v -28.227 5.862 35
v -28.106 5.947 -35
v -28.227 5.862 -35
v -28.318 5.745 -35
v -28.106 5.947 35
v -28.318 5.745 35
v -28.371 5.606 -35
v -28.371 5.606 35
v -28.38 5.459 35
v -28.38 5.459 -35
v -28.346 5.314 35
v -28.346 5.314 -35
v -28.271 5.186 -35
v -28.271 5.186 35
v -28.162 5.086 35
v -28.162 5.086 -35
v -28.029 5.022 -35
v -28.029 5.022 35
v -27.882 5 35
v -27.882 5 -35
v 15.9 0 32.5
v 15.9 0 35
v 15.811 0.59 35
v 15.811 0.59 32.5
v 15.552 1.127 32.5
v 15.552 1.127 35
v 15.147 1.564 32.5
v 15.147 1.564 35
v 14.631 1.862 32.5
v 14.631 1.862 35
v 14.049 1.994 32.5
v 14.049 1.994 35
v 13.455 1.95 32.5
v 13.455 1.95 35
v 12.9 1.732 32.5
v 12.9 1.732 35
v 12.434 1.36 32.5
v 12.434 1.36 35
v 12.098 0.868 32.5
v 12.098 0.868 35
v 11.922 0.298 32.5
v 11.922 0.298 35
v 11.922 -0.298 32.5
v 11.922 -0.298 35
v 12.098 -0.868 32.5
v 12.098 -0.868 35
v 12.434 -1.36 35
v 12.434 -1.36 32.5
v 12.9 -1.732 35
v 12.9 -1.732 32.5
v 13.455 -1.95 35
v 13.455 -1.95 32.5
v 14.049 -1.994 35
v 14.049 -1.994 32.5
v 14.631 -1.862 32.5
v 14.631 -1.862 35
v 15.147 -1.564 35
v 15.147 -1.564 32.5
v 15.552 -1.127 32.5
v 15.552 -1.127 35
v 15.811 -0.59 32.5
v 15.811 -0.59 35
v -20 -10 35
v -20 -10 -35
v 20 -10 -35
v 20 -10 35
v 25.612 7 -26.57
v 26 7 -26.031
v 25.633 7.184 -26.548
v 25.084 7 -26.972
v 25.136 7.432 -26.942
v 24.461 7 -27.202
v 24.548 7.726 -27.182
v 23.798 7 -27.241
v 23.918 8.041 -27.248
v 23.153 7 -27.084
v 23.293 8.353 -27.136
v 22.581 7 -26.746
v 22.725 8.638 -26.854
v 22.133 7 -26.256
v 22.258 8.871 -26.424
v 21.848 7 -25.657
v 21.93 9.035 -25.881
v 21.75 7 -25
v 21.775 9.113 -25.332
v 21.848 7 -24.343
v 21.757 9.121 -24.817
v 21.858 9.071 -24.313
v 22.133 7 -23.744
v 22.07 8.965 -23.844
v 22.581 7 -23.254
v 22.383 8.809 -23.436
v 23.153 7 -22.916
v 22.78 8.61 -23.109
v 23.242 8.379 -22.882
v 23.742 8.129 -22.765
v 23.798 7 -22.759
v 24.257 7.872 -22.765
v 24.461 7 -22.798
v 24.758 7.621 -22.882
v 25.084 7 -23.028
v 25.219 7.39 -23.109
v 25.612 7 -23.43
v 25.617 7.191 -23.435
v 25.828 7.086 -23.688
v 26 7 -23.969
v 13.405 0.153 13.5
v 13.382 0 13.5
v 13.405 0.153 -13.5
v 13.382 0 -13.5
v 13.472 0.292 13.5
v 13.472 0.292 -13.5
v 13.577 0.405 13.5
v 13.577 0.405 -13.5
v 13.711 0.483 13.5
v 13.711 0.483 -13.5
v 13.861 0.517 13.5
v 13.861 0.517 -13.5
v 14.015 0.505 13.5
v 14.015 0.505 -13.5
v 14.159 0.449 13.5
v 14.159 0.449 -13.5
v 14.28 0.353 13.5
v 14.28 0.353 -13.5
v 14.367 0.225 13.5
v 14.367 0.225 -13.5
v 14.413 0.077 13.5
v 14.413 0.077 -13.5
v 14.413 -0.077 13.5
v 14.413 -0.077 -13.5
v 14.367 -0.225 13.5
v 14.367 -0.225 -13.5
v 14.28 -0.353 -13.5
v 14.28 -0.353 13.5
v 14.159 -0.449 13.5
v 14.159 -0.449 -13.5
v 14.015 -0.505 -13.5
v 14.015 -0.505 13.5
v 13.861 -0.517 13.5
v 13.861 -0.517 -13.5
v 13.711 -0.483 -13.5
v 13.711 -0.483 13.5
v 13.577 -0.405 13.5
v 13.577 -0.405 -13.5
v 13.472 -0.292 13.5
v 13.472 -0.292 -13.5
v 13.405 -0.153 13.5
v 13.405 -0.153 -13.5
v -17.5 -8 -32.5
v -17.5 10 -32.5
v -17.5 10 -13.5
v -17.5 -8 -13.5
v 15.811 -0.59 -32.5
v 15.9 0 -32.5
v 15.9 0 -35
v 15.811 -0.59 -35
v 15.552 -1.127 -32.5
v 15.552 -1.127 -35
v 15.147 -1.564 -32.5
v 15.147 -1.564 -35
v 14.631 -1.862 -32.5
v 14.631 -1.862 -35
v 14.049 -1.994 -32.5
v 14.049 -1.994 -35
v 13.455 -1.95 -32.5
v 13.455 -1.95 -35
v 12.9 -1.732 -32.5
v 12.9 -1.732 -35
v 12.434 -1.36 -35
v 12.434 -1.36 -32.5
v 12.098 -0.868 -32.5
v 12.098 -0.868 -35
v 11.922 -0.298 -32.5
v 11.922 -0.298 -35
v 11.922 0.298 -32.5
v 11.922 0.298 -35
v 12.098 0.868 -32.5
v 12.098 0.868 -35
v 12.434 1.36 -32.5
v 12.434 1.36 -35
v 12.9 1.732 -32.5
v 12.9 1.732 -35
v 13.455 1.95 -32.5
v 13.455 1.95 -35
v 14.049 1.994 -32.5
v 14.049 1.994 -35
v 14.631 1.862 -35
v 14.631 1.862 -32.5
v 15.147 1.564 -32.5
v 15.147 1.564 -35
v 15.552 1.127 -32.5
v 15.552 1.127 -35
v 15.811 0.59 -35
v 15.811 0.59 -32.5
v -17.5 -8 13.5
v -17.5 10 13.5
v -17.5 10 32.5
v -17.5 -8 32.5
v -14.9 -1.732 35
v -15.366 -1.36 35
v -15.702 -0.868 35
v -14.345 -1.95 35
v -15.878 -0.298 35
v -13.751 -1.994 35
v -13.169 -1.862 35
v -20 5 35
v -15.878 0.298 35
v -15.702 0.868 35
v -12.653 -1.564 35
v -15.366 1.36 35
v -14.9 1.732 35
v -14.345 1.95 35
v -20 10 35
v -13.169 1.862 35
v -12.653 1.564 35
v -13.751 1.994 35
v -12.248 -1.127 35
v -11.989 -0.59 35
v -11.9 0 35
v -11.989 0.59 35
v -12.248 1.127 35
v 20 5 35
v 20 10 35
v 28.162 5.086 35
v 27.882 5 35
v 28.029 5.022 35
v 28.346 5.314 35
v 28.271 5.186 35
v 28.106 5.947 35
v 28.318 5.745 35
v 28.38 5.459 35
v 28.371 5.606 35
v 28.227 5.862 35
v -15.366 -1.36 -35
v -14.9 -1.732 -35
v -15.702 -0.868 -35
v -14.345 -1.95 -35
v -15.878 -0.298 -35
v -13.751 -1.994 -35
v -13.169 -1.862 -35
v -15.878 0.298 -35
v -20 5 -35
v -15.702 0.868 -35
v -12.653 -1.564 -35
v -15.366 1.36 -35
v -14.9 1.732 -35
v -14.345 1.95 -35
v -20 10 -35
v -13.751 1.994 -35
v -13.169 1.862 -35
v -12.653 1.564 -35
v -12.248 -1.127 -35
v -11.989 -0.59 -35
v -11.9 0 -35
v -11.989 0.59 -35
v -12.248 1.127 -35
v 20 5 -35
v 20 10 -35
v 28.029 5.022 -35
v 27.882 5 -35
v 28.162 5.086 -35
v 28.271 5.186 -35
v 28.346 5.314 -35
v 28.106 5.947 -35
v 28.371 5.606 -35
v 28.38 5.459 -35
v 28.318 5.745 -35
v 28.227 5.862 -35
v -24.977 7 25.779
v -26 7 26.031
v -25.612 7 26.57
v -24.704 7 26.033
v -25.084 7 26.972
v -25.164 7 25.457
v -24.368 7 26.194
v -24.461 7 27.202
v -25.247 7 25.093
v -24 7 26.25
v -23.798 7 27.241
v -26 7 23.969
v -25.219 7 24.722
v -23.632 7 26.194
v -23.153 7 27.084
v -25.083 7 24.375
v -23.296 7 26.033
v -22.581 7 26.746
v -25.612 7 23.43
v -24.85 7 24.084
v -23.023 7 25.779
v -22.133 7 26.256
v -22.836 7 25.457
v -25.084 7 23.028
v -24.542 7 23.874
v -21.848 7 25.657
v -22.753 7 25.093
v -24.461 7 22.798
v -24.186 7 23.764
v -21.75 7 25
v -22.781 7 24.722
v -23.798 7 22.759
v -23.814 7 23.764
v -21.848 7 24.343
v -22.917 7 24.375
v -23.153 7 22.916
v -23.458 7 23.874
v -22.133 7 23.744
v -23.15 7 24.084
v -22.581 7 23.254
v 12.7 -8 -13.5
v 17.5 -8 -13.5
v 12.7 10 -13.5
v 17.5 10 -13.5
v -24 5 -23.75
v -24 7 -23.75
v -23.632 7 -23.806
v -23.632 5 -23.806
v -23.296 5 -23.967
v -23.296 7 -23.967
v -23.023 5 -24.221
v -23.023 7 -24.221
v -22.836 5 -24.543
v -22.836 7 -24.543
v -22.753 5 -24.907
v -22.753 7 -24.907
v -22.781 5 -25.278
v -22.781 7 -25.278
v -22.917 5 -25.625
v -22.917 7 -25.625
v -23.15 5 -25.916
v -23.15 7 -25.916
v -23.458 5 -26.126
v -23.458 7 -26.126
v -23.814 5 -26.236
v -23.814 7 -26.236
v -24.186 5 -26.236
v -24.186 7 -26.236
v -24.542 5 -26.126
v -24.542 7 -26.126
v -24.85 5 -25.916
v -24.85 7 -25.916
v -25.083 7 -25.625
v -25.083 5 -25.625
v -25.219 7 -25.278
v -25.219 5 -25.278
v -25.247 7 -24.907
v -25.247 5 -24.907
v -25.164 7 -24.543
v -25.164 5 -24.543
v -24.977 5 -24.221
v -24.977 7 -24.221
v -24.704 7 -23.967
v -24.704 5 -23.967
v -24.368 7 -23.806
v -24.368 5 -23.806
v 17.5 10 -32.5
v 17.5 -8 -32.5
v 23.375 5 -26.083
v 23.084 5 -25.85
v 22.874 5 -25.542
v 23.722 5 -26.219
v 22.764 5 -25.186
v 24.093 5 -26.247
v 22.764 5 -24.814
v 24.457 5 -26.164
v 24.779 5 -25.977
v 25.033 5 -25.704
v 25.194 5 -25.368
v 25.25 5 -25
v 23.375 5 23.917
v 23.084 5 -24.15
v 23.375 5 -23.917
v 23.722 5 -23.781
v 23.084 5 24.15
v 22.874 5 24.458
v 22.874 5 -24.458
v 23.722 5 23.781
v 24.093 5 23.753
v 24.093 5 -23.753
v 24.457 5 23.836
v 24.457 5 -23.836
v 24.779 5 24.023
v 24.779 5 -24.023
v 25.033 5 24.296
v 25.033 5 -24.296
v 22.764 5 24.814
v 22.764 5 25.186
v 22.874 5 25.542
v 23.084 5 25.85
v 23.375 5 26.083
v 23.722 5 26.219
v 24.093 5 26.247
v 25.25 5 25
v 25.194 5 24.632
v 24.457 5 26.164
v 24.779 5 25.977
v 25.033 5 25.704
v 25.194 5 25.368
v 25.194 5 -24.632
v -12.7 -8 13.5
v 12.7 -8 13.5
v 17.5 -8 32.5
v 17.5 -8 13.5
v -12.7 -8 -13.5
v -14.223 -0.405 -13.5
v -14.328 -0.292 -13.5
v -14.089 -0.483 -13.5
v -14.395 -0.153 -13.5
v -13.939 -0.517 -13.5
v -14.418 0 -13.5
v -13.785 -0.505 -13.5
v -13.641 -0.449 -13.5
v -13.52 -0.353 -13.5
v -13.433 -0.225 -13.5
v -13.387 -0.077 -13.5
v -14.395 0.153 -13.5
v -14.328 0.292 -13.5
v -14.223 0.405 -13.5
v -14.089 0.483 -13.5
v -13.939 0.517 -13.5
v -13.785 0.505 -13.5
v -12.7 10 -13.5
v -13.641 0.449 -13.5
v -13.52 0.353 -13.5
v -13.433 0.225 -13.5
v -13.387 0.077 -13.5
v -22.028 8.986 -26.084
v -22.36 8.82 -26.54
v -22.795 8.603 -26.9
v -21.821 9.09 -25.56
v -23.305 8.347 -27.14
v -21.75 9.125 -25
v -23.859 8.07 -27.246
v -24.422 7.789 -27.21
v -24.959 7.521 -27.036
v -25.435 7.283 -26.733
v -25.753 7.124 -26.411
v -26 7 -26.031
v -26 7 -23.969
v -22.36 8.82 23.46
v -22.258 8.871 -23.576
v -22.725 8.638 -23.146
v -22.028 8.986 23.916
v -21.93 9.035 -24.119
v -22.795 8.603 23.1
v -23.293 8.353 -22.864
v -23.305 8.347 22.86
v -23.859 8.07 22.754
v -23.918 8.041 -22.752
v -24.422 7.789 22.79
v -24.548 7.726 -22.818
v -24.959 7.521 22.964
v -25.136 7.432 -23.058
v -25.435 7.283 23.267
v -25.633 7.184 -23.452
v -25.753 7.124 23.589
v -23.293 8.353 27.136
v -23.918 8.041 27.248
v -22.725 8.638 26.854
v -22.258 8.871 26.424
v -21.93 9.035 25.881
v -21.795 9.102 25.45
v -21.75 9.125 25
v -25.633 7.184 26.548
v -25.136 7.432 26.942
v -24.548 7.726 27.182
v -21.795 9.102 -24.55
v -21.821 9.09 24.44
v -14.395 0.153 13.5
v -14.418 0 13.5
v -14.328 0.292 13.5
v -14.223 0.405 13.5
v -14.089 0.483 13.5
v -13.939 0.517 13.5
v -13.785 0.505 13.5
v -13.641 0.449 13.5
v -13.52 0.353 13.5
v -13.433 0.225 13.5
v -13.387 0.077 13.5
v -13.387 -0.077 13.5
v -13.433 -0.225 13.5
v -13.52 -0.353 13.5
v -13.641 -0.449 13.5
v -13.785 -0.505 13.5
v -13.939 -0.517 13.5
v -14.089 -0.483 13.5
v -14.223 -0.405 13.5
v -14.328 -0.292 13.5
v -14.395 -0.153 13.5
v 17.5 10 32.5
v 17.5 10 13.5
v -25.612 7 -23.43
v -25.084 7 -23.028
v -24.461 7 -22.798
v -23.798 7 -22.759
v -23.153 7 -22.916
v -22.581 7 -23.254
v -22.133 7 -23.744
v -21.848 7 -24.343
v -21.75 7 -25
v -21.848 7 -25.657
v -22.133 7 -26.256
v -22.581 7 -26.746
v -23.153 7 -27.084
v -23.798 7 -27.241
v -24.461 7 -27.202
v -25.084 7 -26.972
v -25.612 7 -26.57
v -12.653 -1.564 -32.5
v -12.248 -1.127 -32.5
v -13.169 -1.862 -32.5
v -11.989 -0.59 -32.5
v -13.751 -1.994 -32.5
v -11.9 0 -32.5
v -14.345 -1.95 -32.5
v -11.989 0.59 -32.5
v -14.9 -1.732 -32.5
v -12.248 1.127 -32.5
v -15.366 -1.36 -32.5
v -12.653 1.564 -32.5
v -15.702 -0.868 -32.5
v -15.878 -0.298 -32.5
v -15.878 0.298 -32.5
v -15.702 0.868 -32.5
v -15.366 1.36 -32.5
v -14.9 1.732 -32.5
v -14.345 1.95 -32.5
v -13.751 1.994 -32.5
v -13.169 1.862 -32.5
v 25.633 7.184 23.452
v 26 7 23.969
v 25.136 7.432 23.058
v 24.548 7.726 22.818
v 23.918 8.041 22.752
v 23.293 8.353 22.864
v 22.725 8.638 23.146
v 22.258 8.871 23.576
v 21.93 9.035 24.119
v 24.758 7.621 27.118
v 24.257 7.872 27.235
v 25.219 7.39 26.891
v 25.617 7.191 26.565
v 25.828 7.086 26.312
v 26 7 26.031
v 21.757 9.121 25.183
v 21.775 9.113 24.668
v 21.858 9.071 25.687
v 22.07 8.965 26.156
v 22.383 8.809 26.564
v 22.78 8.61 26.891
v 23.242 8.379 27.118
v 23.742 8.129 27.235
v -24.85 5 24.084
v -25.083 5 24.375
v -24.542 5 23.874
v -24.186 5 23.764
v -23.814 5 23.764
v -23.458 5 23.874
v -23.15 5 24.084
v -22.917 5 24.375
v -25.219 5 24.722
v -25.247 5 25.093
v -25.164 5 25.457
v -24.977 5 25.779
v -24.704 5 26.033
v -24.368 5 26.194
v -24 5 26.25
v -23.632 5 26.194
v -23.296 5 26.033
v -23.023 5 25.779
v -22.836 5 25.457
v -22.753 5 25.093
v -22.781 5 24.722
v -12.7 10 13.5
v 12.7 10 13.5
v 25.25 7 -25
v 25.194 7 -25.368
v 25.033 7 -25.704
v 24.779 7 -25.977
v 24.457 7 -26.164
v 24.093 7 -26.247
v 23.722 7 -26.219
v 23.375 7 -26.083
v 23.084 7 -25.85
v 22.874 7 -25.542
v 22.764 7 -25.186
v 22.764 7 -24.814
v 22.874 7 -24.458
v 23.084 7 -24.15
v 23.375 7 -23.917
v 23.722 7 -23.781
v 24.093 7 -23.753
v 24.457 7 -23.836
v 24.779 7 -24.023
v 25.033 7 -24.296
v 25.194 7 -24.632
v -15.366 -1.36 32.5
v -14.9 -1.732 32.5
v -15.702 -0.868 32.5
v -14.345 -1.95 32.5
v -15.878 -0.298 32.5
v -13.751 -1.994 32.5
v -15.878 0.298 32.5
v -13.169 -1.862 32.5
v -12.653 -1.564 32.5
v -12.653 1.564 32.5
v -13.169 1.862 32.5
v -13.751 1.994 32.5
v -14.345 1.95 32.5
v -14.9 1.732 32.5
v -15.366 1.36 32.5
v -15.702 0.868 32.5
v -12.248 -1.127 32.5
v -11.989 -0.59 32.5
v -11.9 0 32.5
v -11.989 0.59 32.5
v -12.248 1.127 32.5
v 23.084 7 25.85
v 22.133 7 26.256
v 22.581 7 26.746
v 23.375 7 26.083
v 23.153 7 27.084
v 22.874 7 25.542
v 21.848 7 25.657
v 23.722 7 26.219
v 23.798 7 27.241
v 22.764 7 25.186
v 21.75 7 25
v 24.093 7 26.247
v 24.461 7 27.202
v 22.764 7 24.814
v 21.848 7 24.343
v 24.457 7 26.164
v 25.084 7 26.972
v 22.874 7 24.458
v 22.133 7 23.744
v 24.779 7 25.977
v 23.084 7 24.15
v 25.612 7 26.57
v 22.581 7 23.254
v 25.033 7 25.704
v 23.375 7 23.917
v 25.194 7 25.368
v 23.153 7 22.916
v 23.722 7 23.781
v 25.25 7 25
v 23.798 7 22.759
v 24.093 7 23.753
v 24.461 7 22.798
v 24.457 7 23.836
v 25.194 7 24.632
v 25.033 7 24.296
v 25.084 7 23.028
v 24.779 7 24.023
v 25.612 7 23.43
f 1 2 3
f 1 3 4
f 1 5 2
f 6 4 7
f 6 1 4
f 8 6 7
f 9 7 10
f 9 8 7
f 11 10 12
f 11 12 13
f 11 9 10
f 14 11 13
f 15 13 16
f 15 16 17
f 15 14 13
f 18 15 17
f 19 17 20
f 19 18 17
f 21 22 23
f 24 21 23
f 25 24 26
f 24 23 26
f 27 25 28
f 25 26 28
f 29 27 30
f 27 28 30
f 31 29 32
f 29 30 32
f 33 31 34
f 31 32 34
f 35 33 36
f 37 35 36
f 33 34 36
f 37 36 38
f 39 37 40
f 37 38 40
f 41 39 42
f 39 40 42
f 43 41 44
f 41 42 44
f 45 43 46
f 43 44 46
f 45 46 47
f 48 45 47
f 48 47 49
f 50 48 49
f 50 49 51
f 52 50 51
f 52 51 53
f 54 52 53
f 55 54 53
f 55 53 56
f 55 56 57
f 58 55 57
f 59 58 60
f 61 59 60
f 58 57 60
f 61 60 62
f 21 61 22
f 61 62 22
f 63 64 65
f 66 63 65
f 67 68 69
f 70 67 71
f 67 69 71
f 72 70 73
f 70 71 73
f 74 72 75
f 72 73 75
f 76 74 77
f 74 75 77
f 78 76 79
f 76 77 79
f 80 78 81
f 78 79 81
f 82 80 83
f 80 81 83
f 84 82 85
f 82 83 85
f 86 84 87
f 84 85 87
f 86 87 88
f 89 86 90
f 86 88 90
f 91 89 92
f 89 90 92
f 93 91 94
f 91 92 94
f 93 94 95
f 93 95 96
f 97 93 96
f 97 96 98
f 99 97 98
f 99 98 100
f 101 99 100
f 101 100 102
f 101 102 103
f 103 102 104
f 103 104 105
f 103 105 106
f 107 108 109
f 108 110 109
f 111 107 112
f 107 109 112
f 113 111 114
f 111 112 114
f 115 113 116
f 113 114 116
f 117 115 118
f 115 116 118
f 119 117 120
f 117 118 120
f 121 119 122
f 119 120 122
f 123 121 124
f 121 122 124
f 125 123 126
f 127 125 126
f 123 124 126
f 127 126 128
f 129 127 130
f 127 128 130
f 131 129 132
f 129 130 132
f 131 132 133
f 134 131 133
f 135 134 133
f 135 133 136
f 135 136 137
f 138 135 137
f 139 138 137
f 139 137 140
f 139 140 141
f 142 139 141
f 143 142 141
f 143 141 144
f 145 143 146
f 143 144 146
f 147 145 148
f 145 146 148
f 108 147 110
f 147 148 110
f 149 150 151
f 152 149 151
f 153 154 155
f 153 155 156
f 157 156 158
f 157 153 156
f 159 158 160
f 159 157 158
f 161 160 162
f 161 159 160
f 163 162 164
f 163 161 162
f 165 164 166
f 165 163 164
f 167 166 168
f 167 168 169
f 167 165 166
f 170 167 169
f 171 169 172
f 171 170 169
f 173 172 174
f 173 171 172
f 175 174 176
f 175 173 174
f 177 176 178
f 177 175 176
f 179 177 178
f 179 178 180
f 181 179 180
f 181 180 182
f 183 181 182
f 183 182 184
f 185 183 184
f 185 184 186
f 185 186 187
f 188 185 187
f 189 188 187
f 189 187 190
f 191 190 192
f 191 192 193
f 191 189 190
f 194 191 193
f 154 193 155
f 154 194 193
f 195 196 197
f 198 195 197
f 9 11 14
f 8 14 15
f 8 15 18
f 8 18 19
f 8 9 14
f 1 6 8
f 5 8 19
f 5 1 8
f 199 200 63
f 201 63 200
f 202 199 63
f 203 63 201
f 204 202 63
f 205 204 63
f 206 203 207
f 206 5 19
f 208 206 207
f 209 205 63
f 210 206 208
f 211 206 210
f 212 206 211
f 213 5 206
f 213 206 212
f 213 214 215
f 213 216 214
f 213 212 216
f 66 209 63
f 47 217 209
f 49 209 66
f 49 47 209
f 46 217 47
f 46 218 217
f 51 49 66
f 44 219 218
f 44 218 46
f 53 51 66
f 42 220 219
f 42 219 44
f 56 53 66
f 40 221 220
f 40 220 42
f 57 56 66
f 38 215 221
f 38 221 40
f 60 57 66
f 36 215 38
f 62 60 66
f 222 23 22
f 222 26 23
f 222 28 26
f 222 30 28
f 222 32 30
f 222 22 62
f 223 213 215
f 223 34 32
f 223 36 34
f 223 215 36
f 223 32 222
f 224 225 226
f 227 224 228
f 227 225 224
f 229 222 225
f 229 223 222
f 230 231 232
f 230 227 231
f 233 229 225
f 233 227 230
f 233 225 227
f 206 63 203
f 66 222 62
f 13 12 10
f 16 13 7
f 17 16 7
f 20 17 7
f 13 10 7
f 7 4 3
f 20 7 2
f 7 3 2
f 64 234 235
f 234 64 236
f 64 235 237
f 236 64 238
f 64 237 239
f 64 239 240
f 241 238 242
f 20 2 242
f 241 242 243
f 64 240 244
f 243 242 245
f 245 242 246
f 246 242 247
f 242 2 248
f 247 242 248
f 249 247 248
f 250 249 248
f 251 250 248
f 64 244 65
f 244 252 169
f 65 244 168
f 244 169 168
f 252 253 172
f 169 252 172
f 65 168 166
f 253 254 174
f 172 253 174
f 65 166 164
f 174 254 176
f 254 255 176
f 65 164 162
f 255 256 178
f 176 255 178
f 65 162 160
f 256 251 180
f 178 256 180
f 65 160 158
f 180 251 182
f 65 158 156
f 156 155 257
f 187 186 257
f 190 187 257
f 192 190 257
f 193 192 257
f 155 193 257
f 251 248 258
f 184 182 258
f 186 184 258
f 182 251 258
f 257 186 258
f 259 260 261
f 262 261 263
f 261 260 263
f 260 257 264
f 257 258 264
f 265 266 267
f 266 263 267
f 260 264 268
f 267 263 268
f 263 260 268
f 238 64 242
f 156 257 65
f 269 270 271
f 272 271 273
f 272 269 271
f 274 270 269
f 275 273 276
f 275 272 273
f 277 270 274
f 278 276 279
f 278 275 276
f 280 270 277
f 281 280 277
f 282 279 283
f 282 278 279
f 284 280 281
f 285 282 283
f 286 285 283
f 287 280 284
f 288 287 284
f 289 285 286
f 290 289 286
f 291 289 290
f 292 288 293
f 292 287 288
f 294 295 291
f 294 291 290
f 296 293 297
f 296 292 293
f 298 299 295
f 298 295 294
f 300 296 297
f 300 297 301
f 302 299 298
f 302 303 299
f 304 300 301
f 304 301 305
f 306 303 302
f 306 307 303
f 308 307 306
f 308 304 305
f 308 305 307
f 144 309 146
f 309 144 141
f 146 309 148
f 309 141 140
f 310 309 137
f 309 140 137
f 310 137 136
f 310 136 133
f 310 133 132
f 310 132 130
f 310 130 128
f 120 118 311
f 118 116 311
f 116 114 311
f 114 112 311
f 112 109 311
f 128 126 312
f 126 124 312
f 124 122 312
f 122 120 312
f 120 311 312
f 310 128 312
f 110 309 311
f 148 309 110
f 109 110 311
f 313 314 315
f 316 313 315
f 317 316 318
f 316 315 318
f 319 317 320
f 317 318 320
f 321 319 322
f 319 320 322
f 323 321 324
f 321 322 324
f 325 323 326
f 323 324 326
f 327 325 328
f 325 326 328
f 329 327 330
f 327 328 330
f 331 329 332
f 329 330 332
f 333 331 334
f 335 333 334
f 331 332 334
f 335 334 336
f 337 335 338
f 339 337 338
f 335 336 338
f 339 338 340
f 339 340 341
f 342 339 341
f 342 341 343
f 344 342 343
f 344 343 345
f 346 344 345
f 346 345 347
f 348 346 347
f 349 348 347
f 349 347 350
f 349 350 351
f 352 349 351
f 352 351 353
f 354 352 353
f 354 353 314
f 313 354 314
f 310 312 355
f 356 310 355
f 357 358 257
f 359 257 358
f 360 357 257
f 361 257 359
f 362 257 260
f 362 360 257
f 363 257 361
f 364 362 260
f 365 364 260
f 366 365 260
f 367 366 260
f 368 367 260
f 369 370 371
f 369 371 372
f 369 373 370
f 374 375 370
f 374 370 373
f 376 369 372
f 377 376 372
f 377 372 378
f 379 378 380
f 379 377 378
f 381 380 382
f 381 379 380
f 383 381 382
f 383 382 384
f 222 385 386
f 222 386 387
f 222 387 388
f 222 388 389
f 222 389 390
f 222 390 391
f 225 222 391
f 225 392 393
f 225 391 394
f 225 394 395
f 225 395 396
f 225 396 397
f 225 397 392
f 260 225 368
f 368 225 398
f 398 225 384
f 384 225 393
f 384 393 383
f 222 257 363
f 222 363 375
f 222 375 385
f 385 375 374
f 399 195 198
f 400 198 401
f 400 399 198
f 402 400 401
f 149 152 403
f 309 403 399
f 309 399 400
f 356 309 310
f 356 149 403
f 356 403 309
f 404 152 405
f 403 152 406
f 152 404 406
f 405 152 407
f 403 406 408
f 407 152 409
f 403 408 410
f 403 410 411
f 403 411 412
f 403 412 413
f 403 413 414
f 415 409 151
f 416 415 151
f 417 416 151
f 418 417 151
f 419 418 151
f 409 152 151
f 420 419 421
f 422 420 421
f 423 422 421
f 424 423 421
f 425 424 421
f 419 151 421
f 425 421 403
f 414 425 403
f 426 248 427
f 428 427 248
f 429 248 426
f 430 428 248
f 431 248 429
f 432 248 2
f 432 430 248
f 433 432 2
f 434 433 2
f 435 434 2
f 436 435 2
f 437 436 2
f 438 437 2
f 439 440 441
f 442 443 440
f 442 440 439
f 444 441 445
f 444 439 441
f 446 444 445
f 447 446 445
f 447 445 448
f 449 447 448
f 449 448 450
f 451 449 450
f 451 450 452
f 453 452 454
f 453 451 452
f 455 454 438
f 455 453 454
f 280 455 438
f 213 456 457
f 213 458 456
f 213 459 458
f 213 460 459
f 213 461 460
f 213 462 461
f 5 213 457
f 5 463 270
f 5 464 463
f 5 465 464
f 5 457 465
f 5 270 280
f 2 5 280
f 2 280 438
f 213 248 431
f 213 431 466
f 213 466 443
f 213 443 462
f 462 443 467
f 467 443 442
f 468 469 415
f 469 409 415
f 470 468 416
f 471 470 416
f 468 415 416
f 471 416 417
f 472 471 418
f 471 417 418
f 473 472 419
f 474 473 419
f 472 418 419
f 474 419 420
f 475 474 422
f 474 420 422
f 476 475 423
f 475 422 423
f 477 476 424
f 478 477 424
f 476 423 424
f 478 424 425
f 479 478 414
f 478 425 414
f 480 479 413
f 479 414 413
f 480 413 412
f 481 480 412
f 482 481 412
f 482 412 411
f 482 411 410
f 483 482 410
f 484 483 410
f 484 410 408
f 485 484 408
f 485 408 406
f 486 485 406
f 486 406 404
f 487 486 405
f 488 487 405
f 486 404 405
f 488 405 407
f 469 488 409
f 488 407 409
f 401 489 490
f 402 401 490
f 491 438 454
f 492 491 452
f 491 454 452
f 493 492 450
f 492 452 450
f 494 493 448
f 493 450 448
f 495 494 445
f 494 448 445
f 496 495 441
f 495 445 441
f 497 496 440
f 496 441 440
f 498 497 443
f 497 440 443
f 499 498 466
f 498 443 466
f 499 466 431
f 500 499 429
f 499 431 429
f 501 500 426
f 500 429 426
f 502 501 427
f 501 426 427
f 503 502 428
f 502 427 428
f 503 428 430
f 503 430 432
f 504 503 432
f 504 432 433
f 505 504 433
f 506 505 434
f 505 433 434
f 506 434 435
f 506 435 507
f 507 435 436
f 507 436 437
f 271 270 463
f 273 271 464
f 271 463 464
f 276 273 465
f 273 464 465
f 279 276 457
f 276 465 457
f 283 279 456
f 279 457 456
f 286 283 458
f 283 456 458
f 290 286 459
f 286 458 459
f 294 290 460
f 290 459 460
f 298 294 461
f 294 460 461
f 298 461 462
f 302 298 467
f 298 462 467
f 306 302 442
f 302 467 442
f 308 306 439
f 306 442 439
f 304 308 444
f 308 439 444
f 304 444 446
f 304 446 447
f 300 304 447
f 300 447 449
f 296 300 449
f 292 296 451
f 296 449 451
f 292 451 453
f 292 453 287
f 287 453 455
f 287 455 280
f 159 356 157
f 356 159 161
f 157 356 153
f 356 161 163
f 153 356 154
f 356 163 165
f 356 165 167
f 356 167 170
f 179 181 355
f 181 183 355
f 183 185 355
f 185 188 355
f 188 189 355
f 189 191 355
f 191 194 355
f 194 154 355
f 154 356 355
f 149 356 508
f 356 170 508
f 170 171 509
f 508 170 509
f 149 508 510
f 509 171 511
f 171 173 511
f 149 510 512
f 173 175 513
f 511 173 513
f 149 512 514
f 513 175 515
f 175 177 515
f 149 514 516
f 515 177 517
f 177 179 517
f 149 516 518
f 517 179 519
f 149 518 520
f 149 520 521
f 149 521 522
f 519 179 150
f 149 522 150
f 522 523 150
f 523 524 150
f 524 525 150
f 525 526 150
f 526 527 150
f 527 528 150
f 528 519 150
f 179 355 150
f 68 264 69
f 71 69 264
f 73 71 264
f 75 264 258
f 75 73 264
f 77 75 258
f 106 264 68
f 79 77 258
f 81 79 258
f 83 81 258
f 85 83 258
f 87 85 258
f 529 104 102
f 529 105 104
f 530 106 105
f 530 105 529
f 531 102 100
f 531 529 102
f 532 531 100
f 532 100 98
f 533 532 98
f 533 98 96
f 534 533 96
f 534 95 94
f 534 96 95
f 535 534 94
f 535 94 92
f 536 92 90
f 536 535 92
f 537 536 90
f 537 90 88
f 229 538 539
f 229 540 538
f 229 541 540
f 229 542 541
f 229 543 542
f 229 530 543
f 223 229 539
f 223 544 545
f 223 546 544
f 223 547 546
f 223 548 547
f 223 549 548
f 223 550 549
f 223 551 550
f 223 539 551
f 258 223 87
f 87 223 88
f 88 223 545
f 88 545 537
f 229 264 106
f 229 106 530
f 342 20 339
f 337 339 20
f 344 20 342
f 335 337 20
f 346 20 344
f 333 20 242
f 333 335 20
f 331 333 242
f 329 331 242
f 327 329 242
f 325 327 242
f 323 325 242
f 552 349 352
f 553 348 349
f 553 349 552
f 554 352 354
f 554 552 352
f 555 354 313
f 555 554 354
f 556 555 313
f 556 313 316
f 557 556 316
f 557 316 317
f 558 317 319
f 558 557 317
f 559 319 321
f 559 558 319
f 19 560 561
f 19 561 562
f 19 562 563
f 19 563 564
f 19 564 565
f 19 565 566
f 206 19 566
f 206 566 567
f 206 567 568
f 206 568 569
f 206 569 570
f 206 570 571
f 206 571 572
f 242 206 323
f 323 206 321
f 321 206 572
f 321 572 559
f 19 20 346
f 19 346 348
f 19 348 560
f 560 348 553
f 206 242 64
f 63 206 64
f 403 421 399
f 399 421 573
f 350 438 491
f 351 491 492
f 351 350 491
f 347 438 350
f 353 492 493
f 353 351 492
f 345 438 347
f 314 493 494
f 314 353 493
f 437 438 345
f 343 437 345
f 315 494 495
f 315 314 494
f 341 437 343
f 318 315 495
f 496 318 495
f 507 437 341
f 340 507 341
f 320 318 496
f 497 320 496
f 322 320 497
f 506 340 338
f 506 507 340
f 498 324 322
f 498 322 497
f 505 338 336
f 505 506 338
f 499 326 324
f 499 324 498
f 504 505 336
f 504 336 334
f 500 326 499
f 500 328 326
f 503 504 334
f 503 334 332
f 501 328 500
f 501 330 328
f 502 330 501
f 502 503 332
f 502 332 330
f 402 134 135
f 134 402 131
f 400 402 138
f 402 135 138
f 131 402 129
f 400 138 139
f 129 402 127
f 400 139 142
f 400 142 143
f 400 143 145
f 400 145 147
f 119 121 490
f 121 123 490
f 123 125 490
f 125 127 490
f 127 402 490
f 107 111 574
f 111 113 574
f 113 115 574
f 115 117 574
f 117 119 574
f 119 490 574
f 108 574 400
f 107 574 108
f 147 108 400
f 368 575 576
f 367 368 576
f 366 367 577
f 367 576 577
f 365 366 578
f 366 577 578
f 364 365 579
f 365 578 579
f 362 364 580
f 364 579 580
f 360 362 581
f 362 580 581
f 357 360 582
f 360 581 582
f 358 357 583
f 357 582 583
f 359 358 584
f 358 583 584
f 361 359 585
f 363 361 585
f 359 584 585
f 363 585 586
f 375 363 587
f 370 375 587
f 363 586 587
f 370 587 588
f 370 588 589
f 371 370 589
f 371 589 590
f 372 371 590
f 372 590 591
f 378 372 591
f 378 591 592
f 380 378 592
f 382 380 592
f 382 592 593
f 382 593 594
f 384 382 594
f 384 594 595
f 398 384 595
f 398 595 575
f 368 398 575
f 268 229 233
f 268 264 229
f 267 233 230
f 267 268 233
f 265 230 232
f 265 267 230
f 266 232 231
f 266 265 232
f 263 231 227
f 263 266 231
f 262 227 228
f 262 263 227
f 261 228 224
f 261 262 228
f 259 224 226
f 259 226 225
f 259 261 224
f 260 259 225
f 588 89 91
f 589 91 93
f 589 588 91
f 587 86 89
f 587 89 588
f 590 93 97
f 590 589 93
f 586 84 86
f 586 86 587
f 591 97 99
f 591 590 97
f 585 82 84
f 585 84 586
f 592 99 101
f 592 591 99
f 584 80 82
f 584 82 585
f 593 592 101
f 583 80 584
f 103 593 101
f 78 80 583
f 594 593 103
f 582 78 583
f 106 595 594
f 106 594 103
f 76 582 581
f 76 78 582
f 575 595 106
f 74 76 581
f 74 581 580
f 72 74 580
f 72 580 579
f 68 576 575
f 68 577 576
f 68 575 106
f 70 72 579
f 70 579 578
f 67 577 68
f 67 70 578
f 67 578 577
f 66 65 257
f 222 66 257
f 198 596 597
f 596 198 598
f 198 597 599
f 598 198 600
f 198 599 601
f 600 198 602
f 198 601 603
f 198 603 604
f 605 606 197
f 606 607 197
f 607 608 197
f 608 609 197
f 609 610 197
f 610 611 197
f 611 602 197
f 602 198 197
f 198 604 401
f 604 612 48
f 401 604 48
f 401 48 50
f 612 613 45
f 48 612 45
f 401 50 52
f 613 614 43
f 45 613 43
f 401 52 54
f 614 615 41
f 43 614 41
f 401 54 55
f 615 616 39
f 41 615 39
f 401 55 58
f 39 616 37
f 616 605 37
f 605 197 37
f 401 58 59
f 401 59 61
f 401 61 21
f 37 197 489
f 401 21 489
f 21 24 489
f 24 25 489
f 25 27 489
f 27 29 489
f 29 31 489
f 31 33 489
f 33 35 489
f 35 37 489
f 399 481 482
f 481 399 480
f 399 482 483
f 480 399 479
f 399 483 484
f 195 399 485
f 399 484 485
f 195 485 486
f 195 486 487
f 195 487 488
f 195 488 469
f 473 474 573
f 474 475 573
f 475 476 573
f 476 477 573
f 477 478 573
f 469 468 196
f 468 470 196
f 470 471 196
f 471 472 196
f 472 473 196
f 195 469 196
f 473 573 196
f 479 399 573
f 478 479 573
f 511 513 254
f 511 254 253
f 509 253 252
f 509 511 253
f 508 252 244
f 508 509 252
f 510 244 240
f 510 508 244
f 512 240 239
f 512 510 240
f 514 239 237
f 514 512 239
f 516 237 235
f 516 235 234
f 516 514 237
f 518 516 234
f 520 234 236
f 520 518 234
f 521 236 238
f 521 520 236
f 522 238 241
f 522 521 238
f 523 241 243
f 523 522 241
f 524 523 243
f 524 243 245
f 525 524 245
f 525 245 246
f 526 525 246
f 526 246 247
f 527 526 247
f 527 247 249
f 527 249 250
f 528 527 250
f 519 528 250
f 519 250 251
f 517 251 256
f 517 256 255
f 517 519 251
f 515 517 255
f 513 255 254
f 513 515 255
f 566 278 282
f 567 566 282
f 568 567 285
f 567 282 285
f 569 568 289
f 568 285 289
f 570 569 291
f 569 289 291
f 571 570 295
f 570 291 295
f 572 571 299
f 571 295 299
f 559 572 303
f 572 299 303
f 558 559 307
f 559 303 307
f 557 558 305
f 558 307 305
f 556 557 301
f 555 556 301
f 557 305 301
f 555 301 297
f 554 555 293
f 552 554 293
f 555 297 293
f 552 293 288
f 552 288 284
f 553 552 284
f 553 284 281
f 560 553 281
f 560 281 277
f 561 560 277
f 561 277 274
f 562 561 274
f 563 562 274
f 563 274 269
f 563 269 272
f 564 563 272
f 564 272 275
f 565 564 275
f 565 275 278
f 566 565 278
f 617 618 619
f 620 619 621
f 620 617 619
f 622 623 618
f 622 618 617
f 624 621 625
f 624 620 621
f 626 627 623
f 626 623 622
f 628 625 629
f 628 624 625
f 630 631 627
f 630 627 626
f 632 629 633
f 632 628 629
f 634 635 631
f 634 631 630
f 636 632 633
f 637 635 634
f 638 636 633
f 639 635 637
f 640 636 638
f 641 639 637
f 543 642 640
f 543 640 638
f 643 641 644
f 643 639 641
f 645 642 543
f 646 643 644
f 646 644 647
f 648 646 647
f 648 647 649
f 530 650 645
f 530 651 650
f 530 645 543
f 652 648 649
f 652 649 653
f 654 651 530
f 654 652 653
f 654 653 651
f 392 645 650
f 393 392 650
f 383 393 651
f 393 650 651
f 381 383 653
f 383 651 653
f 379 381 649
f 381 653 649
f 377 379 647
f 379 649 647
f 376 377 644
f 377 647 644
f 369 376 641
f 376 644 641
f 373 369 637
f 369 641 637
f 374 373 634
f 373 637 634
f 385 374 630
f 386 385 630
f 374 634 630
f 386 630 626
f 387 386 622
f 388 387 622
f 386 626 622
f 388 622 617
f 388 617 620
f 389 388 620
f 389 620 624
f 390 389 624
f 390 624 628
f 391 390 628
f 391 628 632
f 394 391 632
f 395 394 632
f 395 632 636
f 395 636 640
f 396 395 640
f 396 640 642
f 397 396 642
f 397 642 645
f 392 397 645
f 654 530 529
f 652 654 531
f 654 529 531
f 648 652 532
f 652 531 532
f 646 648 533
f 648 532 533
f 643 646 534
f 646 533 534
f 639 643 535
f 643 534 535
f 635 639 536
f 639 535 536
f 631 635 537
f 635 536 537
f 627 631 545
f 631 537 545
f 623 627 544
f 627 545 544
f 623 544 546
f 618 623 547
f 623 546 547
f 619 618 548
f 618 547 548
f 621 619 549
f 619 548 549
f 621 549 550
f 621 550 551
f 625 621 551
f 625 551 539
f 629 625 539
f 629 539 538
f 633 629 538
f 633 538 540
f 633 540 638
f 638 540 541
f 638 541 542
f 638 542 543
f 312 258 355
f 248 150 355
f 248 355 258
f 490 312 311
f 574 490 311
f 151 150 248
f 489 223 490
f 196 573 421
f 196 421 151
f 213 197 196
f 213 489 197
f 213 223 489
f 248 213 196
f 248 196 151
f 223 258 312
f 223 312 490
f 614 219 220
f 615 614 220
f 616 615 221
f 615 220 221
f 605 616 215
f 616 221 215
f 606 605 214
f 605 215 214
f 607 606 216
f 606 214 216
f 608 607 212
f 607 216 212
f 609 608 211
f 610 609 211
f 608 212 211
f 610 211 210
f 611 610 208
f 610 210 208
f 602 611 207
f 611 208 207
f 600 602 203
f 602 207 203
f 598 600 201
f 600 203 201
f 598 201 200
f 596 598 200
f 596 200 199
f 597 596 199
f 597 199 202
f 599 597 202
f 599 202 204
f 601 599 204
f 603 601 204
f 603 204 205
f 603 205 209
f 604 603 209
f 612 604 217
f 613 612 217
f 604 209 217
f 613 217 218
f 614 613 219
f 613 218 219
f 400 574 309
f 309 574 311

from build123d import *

# Parameters (mm, degrees)
BOSS_EXTRUDE1_DEPTH = 35
CUT_EXTRUDE1_DEPTH  = 18
SKETCH3_R           = 1.25
CUT_EXTRUDE2_DEPTH  = 51.249378106
SKETCH5_R           = 0.518350726
CUT_EXTRUDE5_DEPTH  = 30
FILLET2_R           = 0.5
SKETCH7_R           = 2.25
CUT_EXTRUDE6_DEPTH  = 3
SKETCH8_R           = 2
CUT_EXTRUDE7_DEPTH  = 2.5
CUT_EXTRUDE8_START  = -2.5
SKETCH9_R           = 2
CUT_EXTRUDE8_DEPTH  = 2.5


with BuildPart() as part:
    # Sketch1 → Boss-Extrude1 (new, symmetric)
    with BuildSketch(Plane.XY):
        Polygon((-20, 5), (-20, 10), (-30, 5), align=None)
        Polygon((20, 10), (-20, 10), (-20, 5), (-20, -10), (20, -10), (20, 5), align=None)
        Polygon((30, 5), (20, 10), (20, 5), align=None)
    extrude(amount=BOSS_EXTRUDE1_DEPTH, both=True)

    # Sketch2 → Cut-Extrude1 (cut)
    with BuildSketch(Plane(origin=(0, 10, 0), x_dir=(1, 0, 0), z_dir=(0, 1, 0))):
        Polygon((-17.5, -13.5), (-17.5, -32.5), (17.5, -32.5), (17.5, -13.5), (12.7, -13.5), (12.7, 13.5), (17.5, 13.5), (17.5, 32.5), (-17.5, 32.5), (-17.5, 13.5), (-12.7, 13.5), (-12.7, -13.5), align=None)
    extrude(amount=-CUT_EXTRUDE1_DEPTH, mode=Mode.SUBTRACT)

    # Sketch3 → Cut-Extrude2 (cut, through all)
    with BuildSketch(Plane(origin=(0, 10, 0), x_dir=(1, 0, 0), z_dir=(0, 1, 0))):
        with Locations(Location((-24, 25, 0), (0, 0, 270))):
            Circle(SKETCH3_R)
        with Locations(Location((-24, -25, 0), (0, 0, 270))):
            Circle(SKETCH3_R)
        with Locations((24, 25)):
            Circle(SKETCH3_R)
        with Locations((24, -25)):
            Circle(SKETCH3_R)
    extrude(amount=-CUT_EXTRUDE2_DEPTH, mode=Mode.SUBTRACT)

    # Sketch5 → Cut-Extrude5 (cut, symmetric)
    with BuildSketch(Plane(origin=(0, 0, 0), x_dir=(-1, 0, 0), z_dir=(0, 0, -1))):
        with Locations((-13.9, 0)):
            Circle(SKETCH5_R)
        with Locations((13.9, 0)):
            Circle(SKETCH5_R)
    extrude(amount=CUT_EXTRUDE5_DEPTH, both=True, mode=Mode.SUBTRACT)

    # Fillet2
    fillet2_edges = [part.edges().sort_by_distance(p)[0] for p in [
        (-30, 5, 0),
        (30, 5, 0),
    ]]
    fillet(fillet2_edges, radius=FILLET2_R)

    # Sketch7 → Cut-Extrude6 (cut)
    with BuildSketch(Plane(origin=(0, 10, 0), x_dir=(1, 0, 0), z_dir=(0, 1, 0))):
        with Locations((-24, 25)):
            Circle(SKETCH7_R)
        with Locations((24, 25)):
            Circle(SKETCH7_R)
        with Locations((-24, -25)):
            Circle(SKETCH7_R)
        with Locations((24, -25)):
            Circle(SKETCH7_R)
    extrude(amount=-CUT_EXTRUDE6_DEPTH, mode=Mode.SUBTRACT)

    # Sketch8 → Cut-Extrude7 (cut)
    with BuildSketch(Plane.XY.offset(35)):
        with Locations((-13.9, 0)):
            Circle(SKETCH8_R)
        with Locations((13.9, 0)):
            Circle(SKETCH8_R)
    extrude(amount=-CUT_EXTRUDE7_DEPTH, mode=Mode.SUBTRACT)

    # Sketch9 → Cut-Extrude8 (cut)
    with BuildSketch(Plane(origin=(0, 0, -35), x_dir=(-1, 0, 0), z_dir=(0, 0, -1)).offset(CUT_EXTRUDE8_START)):
        with Locations(Location((13.9, 0, 0), (0, 0, 180))):
            Circle(SKETCH9_R)
        with Locations(Location((-13.9, 0, 0), (0, 0, 180))):
            Circle(SKETCH9_R)
    extrude(amount=CUT_EXTRUDE8_DEPTH, mode=Mode.SUBTRACT)


solid = part.part
